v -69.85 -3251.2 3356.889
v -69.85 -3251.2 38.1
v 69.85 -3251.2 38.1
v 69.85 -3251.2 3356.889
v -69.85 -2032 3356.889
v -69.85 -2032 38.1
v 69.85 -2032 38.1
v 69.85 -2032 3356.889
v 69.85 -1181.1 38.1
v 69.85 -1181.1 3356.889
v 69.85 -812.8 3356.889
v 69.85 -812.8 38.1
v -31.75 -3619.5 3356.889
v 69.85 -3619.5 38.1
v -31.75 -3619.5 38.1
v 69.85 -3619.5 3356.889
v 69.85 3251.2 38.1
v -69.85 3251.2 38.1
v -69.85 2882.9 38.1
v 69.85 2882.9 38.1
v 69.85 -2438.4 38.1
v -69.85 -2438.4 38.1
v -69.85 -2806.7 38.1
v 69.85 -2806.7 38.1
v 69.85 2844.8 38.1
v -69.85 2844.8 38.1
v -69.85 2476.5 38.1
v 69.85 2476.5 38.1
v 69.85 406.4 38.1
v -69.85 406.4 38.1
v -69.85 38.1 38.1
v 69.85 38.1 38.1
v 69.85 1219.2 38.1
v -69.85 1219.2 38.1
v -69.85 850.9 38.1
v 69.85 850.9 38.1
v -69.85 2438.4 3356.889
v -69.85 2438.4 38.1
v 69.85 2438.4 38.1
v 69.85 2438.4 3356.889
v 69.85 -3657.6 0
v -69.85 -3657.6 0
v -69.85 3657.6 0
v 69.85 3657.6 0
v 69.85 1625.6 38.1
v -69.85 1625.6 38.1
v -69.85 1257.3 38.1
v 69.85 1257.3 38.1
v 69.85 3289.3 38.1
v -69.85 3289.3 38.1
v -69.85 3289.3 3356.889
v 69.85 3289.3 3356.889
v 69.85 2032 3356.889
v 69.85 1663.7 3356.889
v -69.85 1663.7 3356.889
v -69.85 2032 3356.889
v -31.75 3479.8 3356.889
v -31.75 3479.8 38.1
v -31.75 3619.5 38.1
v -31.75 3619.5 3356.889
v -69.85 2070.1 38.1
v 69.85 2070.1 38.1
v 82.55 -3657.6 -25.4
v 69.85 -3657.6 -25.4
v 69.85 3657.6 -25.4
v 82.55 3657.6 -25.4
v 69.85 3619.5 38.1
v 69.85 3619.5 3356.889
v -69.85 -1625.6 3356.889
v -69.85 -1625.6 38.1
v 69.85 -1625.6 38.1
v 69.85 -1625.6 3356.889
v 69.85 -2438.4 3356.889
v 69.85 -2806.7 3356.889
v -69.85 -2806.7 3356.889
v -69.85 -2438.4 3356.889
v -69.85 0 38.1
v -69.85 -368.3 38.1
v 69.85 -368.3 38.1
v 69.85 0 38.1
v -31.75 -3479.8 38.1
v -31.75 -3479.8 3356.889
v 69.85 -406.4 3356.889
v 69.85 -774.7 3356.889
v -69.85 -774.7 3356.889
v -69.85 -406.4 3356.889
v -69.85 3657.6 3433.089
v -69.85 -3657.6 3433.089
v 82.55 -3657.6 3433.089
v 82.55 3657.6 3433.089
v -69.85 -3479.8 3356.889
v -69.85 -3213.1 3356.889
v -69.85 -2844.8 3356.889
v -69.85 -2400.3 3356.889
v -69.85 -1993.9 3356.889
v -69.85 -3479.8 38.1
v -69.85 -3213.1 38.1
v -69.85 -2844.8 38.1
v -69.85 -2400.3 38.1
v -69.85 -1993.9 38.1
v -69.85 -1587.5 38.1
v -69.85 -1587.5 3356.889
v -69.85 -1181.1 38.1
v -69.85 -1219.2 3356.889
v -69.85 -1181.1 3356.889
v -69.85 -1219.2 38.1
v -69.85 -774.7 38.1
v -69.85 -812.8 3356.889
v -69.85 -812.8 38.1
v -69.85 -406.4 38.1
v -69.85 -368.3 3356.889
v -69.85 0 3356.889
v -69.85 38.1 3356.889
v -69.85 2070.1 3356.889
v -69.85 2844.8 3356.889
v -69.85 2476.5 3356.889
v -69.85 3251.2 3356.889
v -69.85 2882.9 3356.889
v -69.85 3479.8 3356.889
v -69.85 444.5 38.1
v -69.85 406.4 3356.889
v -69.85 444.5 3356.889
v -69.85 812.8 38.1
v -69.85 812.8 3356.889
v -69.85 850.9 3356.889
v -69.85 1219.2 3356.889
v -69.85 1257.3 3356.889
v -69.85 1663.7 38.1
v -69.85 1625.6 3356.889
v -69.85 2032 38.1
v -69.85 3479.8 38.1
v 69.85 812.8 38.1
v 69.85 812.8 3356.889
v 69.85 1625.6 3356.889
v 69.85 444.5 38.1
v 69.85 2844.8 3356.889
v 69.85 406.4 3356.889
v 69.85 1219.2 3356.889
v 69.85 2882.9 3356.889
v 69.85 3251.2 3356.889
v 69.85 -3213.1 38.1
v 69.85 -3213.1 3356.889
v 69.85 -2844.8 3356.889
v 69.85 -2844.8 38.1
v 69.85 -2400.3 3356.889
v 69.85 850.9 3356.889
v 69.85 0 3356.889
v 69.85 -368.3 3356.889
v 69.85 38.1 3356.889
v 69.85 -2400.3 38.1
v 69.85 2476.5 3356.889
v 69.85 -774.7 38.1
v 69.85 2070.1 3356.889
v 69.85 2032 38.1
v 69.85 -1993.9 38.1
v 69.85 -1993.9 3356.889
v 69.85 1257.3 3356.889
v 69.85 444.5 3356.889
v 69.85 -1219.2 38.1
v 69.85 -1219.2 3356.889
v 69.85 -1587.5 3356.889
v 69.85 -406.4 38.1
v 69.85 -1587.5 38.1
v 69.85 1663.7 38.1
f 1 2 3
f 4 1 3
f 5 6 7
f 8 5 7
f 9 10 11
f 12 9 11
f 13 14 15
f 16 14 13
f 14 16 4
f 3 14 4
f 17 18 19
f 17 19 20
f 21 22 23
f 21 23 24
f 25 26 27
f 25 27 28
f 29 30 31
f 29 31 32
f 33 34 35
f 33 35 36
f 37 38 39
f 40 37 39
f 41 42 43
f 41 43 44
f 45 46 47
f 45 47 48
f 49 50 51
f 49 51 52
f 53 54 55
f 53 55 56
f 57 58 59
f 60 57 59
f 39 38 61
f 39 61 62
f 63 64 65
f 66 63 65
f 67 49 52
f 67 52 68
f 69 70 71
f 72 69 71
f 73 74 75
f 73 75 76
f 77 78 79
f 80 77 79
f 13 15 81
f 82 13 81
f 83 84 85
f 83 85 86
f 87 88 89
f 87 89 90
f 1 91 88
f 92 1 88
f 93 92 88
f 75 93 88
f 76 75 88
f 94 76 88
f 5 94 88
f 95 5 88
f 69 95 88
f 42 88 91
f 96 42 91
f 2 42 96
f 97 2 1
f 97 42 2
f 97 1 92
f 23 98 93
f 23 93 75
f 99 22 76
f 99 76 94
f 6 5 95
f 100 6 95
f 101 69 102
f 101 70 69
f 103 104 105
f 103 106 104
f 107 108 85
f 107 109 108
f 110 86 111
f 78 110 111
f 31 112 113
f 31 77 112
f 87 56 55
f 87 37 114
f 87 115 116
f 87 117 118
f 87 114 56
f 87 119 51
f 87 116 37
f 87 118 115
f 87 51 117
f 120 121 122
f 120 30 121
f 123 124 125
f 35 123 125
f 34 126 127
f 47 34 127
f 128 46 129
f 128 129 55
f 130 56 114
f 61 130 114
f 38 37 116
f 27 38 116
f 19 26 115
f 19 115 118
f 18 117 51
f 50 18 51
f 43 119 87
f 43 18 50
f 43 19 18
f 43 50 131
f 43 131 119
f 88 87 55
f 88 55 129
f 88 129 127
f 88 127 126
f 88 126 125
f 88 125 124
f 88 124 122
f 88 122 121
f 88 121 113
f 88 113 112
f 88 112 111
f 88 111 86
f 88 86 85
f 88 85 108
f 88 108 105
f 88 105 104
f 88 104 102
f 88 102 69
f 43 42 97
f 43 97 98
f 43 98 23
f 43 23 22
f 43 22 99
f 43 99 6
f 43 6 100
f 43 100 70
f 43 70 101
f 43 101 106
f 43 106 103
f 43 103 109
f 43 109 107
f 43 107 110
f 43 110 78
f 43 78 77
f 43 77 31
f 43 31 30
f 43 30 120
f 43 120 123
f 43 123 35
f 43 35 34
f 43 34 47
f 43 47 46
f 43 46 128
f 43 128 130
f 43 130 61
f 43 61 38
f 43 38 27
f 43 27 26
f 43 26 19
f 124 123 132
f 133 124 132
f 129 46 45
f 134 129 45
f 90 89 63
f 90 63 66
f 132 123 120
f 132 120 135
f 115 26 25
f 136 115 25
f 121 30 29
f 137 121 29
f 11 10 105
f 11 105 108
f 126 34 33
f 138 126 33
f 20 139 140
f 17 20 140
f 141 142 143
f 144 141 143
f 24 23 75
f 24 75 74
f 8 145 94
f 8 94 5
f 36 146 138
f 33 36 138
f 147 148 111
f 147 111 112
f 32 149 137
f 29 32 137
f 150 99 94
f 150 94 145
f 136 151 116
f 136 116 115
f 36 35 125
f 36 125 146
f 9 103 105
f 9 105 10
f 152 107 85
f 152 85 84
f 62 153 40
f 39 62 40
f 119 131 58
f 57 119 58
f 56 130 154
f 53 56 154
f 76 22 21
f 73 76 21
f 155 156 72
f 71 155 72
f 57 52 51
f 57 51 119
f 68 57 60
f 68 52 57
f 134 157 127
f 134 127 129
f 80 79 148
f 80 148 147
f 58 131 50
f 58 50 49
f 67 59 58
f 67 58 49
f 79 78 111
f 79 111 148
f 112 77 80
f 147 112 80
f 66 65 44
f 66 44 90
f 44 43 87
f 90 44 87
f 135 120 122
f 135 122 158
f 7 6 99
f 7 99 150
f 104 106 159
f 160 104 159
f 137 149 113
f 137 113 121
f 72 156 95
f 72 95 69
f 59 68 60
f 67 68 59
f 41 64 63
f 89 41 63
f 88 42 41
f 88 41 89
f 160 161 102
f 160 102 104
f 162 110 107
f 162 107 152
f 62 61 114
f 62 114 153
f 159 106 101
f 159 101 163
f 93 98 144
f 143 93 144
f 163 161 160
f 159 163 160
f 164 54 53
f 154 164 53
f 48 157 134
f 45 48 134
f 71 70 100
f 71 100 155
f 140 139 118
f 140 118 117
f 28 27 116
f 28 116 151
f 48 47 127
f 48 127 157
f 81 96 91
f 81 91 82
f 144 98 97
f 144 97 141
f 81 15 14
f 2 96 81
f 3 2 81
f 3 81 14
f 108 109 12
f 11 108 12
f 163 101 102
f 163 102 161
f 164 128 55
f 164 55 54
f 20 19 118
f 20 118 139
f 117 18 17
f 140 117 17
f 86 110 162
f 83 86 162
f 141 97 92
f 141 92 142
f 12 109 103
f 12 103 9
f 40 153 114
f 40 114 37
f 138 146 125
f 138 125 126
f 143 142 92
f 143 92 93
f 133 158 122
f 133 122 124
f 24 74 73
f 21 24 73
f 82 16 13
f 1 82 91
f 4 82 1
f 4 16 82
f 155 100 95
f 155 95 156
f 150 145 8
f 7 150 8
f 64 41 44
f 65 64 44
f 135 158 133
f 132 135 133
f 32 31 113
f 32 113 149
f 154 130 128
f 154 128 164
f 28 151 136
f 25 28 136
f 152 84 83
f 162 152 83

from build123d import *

# Parameters (mm, degrees)
F0_W     = 139.7
F0_H     = 7315.2
F1_DEPTH = 38.1
F3_DEPTH = 139.7
F4_W     = 38.1
F4_H     = 139.7
F4_W_2   = 139.7
F4_H_2   = 38.1
F5_DEPTH = 3318.7894
F6_W     = 7315.2
F6_H     = 3458.4894
F7_DEPTH = 12.7


with BuildPart() as f1:
    # F0 (on Top) → F1 (new body)
    with BuildSketch(Plane.XY):
        Rectangle(F0_W, F0_H)
    extrude(amount=F1_DEPTH)

    # F2 (on face) → F3 (join, through all)
    with BuildSketch(Plane.YZ.offset(69.85)):
        Polygon((3657.6, 3433.0894), (-3657.6, 3433.0894), (-3657.6, 38.1), (-3619.5, 38.1), (-3619.5, 3356.8894), (3619.5, 3356.8894), (3619.5, 38.1), (3657.6, 38.1), align=None)
    extrude(amount=-F3_DEPTH)

    # F4 (on face) → F5 (join, through all)
    with BuildSketch(Plane.XY.offset(38.1)):
        with Locations((-50.8, -3549.65)):
            Rectangle(F4_W, F4_H)
        with Locations((0, -3232.15)):
            Rectangle(F4_W_2, F4_H_2)
        with Locations((0, -2825.75)):
            Rectangle(F4_W_2, F4_H_2)
        with Locations((0, -2419.35)):
            Rectangle(F4_W_2, F4_H_2)
        with Locations((0, -2012.95)):
            Rectangle(F4_W_2, F4_H_2)
        with Locations((0, -1606.55)):
            Rectangle(F4_W_2, F4_H_2)
        with Locations((0, -1200.15)):
            Rectangle(F4_W_2, F4_H_2)
        with Locations((0, -793.75)):
            Rectangle(F4_W_2, F4_H_2)
        with Locations((0, -387.35)):
            Rectangle(F4_W_2, F4_H_2)
        with Locations((0, 19.05)):
            Rectangle(F4_W_2, F4_H_2)
        with Locations((0, 425.45)):
            Rectangle(F4_W_2, F4_H_2)
        with Locations((0, 831.85)):
            Rectangle(F4_W_2, F4_H_2)
        with Locations((0, 1238.25)):
            Rectangle(F4_W_2, F4_H_2)
        with Locations((0, 1644.65)):
            Rectangle(F4_W_2, F4_H_2)
        with Locations((0, 2051.05)):
            Rectangle(F4_W_2, F4_H_2)
        with Locations((0, 2457.45)):
            Rectangle(F4_W_2, F4_H_2)
        with Locations((0, 2863.85)):
            Rectangle(F4_W_2, F4_H_2)
        with Locations((0, 3270.25)):
            Rectangle(F4_W_2, F4_H_2)
        with Locations((-50.8, 3549.65)):
            Rectangle(F4_W, F4_H)
    extrude(amount=F5_DEPTH)

    # F6 (on face) → F7 (join)
    with BuildSketch(Plane.YZ.offset(69.85)):
        with Locations((0, 1703.8447)):
            Rectangle(F6_W, F6_H)
    extrude(amount=F7_DEPTH)


solid = f1.part
